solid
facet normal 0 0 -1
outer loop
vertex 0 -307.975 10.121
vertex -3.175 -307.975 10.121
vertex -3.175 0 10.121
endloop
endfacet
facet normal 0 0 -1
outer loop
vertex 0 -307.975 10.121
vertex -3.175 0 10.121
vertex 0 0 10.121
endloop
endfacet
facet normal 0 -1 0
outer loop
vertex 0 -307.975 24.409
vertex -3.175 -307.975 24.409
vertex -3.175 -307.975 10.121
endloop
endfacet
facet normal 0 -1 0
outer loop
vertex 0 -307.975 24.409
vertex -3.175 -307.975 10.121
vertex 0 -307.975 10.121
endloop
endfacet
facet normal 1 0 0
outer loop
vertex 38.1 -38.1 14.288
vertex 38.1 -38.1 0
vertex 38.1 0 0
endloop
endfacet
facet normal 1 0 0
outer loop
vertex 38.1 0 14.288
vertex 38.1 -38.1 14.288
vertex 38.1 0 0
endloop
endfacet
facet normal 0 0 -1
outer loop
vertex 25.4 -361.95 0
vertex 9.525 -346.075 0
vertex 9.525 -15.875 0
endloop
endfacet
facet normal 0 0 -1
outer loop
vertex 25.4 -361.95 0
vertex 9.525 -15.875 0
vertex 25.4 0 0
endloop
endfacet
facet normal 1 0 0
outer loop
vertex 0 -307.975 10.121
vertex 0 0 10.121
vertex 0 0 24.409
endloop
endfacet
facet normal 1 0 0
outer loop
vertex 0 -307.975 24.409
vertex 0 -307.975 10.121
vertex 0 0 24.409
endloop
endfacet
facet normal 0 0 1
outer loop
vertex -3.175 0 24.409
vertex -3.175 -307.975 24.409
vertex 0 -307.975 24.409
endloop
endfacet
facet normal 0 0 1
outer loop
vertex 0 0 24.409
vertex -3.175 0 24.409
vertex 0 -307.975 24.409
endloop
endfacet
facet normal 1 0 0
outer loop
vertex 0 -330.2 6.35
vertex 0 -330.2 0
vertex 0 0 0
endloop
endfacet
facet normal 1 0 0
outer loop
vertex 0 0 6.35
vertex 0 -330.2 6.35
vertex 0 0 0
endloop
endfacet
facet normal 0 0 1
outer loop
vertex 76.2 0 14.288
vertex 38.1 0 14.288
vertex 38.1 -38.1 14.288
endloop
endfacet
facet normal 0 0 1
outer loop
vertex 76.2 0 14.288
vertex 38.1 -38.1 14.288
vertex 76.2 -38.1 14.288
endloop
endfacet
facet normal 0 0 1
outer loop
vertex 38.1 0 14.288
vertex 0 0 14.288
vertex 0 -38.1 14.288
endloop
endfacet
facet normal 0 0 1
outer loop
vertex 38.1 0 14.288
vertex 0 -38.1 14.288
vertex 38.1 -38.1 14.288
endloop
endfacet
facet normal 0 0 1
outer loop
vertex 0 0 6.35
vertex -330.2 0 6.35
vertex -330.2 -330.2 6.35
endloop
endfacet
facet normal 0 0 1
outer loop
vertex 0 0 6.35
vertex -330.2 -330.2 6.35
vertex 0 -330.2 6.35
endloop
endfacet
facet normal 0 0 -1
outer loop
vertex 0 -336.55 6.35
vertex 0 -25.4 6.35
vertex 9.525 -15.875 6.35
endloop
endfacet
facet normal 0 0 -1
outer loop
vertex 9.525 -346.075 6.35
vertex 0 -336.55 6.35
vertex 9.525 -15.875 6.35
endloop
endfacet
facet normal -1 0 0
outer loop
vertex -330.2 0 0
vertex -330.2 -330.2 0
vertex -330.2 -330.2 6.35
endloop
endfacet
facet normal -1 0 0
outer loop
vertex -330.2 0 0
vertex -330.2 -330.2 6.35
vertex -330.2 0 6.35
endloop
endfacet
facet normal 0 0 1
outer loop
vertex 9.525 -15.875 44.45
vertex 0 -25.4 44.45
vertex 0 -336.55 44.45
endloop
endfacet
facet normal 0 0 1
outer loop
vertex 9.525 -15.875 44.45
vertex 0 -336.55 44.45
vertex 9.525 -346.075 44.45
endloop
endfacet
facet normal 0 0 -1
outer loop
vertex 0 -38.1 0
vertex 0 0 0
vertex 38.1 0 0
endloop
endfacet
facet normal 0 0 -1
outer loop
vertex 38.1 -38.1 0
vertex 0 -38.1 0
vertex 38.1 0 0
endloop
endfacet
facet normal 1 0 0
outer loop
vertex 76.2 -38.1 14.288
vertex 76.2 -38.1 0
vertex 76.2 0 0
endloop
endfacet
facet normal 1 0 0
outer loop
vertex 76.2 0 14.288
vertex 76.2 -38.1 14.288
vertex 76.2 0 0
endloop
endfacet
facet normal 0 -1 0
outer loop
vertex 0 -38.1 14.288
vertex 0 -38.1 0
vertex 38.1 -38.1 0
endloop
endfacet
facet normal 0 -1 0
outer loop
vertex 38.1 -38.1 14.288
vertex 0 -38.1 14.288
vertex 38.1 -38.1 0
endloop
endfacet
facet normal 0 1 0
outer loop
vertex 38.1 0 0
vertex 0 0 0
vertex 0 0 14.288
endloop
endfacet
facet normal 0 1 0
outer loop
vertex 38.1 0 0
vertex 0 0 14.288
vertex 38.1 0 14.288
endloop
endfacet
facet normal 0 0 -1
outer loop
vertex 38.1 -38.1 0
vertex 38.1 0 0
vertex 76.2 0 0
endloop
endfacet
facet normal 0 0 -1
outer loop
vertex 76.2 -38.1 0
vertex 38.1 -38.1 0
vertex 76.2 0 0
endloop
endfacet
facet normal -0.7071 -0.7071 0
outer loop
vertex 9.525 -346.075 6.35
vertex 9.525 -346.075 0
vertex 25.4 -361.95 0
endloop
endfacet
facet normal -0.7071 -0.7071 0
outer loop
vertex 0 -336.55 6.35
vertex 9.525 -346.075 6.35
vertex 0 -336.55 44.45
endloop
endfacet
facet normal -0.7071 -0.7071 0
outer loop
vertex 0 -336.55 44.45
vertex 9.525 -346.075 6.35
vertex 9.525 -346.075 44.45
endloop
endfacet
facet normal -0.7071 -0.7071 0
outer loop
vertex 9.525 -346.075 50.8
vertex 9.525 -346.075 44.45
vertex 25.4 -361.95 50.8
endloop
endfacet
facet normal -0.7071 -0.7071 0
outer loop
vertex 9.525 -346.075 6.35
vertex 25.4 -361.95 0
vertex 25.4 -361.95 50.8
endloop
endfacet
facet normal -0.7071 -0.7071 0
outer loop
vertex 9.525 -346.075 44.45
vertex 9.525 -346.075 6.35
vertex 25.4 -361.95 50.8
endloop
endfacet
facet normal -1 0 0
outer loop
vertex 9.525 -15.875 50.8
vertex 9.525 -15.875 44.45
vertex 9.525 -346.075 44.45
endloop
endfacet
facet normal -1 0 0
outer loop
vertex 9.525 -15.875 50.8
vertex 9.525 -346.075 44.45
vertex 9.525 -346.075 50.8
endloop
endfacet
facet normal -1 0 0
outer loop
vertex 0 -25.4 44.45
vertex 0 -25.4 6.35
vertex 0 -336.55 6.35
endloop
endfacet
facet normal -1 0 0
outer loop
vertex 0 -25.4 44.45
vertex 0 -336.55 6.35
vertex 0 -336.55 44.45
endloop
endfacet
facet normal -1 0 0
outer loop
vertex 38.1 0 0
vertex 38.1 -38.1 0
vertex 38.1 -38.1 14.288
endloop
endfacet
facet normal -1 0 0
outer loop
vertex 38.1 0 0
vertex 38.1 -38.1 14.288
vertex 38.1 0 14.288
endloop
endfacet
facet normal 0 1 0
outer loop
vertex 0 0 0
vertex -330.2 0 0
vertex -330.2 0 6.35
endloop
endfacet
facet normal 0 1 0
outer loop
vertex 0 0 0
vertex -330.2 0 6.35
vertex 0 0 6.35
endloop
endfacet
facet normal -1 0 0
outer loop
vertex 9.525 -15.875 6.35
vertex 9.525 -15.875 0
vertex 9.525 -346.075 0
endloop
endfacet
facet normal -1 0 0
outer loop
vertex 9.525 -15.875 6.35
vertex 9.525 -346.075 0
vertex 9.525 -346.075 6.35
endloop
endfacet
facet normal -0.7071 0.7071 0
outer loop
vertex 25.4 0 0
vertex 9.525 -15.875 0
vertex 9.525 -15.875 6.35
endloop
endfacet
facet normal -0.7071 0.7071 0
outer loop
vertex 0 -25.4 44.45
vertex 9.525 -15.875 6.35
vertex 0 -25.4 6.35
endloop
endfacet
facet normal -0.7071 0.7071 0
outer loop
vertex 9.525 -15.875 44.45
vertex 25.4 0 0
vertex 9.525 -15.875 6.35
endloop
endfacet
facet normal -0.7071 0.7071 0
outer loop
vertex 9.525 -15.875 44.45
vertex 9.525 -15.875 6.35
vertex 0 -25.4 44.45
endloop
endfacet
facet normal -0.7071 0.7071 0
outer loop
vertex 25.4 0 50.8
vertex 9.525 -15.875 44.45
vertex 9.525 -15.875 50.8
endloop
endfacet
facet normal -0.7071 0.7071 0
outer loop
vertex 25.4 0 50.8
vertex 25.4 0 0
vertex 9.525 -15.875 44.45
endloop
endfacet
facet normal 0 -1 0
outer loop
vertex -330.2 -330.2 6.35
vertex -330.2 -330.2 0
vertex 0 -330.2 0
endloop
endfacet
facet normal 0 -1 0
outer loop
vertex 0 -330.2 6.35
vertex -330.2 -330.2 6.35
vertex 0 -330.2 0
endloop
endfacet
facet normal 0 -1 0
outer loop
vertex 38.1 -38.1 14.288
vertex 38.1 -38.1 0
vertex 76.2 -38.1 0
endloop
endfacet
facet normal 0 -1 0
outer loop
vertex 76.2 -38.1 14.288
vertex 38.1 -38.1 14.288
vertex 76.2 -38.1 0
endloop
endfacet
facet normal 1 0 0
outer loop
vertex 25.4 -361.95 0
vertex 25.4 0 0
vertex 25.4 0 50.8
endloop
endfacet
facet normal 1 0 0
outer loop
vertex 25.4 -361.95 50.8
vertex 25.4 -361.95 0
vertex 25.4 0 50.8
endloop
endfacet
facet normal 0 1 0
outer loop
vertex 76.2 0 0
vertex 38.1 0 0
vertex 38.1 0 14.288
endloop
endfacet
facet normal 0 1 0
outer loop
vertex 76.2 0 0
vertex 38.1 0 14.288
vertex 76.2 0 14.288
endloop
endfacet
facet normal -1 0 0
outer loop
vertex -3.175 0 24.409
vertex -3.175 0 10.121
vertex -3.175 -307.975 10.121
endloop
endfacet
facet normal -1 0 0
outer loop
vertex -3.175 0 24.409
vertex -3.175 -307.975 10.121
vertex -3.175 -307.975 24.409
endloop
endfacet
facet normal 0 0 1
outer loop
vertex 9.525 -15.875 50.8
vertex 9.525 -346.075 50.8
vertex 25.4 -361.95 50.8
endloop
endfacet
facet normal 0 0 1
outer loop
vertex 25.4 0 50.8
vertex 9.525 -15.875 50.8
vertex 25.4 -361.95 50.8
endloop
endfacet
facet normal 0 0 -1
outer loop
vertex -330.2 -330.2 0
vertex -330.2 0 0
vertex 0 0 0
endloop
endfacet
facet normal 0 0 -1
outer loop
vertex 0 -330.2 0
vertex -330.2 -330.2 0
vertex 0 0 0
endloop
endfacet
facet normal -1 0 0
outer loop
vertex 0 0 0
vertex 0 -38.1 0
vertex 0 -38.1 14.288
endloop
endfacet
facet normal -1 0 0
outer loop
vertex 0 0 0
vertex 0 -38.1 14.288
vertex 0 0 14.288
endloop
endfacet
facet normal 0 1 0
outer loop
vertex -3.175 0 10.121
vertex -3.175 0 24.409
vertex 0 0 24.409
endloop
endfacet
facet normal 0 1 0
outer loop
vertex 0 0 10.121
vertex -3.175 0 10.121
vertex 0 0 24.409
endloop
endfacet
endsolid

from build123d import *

# Parameters (mm, degrees)
F0_W      = 330.2
F0_H      = 330.2
F3_DEPTH  = 6.35
F2_W      = 38.1
F2_H      = 38.1
F4_DEPTH  = 14.2875
F1_W      = 25.4
F1_H      = 50.8
F5_DEPTH  = 361.95
F8_SIZE   = 25.39999
F6_W      = 9.525
F6_H      = 6.35
F9_DEPTH  = 361.951
F7_W      = 3.175
F7_H      = 14.2875
F10_DEPTH = 307.975
F11_W     = 38.1
F11_H     = 38.1
F12_DEPTH = 14.2875


# Not quite as in the source:
# - a fillet or chamfer is up to 0.001 mm smaller than in the source, because OpenCascade refuses the exact size


with BuildPart() as f3:
    # F0 (on Top) → F3 (new body)
    with BuildSketch(Plane.XY):
        with Locations((-165.1, -165.1)):
            Rectangle(F0_W, F0_H)
    extrude(amount=F3_DEPTH)


with BuildPart() as f4:
    # F2 (on Top) → F4 (new body)
    with BuildSketch(Plane.XY):
        with Locations((19.05, -19.05)):
            Rectangle(F2_W, F2_H)
    extrude(amount=F4_DEPTH)


with BuildPart() as f5:
    # F1 (on Front) → F5 (new body)
    with BuildSketch(Plane.XZ):
        with Locations((12.7, 25.4)):
            Rectangle(F1_W, F1_H)
    extrude(amount=F5_DEPTH)

    # F8 (size 25.4 in the source; OpenCascade refuses exactly that, so slightly less here)
    f8_edges = [f5.edges().sort_by_distance(p)[0] for p in [
        (0, -361.95, 25.4),
        (0, 0, 25.4),
    ]]
    chamfer(f8_edges, length=F8_SIZE)

    # F6 (on face) → F9 (cut, through all)
    with BuildSketch(Plane.XZ.offset(361.95)):
        with Locations((4.7625, 47.625)):
            Rectangle(F6_W, F6_H)
        with Locations((4.7625, 3.175)):
            Rectangle(F6_W, F6_H)
    extrude(amount=-F9_DEPTH, mode=Mode.SUBTRACT)


with BuildPart() as f10:
    # F7 (on Front) → F10 (new body)
    with BuildSketch(Plane.XZ):
        with Locations((-1.5875, 17.2649201432)):
            Rectangle(F7_W, F7_H)
    extrude(amount=F10_DEPTH)


with BuildPart() as f12:
    # F11 (on Top) → F12 (new body)
    with BuildSketch(Plane.XY):
        with Locations((57.15, -19.05)):
            Rectangle(F11_W, F11_H)
    extrude(amount=F12_DEPTH)


solid = Compound([f3.part, f4.part, f5.part, f10.part, f12.part])
